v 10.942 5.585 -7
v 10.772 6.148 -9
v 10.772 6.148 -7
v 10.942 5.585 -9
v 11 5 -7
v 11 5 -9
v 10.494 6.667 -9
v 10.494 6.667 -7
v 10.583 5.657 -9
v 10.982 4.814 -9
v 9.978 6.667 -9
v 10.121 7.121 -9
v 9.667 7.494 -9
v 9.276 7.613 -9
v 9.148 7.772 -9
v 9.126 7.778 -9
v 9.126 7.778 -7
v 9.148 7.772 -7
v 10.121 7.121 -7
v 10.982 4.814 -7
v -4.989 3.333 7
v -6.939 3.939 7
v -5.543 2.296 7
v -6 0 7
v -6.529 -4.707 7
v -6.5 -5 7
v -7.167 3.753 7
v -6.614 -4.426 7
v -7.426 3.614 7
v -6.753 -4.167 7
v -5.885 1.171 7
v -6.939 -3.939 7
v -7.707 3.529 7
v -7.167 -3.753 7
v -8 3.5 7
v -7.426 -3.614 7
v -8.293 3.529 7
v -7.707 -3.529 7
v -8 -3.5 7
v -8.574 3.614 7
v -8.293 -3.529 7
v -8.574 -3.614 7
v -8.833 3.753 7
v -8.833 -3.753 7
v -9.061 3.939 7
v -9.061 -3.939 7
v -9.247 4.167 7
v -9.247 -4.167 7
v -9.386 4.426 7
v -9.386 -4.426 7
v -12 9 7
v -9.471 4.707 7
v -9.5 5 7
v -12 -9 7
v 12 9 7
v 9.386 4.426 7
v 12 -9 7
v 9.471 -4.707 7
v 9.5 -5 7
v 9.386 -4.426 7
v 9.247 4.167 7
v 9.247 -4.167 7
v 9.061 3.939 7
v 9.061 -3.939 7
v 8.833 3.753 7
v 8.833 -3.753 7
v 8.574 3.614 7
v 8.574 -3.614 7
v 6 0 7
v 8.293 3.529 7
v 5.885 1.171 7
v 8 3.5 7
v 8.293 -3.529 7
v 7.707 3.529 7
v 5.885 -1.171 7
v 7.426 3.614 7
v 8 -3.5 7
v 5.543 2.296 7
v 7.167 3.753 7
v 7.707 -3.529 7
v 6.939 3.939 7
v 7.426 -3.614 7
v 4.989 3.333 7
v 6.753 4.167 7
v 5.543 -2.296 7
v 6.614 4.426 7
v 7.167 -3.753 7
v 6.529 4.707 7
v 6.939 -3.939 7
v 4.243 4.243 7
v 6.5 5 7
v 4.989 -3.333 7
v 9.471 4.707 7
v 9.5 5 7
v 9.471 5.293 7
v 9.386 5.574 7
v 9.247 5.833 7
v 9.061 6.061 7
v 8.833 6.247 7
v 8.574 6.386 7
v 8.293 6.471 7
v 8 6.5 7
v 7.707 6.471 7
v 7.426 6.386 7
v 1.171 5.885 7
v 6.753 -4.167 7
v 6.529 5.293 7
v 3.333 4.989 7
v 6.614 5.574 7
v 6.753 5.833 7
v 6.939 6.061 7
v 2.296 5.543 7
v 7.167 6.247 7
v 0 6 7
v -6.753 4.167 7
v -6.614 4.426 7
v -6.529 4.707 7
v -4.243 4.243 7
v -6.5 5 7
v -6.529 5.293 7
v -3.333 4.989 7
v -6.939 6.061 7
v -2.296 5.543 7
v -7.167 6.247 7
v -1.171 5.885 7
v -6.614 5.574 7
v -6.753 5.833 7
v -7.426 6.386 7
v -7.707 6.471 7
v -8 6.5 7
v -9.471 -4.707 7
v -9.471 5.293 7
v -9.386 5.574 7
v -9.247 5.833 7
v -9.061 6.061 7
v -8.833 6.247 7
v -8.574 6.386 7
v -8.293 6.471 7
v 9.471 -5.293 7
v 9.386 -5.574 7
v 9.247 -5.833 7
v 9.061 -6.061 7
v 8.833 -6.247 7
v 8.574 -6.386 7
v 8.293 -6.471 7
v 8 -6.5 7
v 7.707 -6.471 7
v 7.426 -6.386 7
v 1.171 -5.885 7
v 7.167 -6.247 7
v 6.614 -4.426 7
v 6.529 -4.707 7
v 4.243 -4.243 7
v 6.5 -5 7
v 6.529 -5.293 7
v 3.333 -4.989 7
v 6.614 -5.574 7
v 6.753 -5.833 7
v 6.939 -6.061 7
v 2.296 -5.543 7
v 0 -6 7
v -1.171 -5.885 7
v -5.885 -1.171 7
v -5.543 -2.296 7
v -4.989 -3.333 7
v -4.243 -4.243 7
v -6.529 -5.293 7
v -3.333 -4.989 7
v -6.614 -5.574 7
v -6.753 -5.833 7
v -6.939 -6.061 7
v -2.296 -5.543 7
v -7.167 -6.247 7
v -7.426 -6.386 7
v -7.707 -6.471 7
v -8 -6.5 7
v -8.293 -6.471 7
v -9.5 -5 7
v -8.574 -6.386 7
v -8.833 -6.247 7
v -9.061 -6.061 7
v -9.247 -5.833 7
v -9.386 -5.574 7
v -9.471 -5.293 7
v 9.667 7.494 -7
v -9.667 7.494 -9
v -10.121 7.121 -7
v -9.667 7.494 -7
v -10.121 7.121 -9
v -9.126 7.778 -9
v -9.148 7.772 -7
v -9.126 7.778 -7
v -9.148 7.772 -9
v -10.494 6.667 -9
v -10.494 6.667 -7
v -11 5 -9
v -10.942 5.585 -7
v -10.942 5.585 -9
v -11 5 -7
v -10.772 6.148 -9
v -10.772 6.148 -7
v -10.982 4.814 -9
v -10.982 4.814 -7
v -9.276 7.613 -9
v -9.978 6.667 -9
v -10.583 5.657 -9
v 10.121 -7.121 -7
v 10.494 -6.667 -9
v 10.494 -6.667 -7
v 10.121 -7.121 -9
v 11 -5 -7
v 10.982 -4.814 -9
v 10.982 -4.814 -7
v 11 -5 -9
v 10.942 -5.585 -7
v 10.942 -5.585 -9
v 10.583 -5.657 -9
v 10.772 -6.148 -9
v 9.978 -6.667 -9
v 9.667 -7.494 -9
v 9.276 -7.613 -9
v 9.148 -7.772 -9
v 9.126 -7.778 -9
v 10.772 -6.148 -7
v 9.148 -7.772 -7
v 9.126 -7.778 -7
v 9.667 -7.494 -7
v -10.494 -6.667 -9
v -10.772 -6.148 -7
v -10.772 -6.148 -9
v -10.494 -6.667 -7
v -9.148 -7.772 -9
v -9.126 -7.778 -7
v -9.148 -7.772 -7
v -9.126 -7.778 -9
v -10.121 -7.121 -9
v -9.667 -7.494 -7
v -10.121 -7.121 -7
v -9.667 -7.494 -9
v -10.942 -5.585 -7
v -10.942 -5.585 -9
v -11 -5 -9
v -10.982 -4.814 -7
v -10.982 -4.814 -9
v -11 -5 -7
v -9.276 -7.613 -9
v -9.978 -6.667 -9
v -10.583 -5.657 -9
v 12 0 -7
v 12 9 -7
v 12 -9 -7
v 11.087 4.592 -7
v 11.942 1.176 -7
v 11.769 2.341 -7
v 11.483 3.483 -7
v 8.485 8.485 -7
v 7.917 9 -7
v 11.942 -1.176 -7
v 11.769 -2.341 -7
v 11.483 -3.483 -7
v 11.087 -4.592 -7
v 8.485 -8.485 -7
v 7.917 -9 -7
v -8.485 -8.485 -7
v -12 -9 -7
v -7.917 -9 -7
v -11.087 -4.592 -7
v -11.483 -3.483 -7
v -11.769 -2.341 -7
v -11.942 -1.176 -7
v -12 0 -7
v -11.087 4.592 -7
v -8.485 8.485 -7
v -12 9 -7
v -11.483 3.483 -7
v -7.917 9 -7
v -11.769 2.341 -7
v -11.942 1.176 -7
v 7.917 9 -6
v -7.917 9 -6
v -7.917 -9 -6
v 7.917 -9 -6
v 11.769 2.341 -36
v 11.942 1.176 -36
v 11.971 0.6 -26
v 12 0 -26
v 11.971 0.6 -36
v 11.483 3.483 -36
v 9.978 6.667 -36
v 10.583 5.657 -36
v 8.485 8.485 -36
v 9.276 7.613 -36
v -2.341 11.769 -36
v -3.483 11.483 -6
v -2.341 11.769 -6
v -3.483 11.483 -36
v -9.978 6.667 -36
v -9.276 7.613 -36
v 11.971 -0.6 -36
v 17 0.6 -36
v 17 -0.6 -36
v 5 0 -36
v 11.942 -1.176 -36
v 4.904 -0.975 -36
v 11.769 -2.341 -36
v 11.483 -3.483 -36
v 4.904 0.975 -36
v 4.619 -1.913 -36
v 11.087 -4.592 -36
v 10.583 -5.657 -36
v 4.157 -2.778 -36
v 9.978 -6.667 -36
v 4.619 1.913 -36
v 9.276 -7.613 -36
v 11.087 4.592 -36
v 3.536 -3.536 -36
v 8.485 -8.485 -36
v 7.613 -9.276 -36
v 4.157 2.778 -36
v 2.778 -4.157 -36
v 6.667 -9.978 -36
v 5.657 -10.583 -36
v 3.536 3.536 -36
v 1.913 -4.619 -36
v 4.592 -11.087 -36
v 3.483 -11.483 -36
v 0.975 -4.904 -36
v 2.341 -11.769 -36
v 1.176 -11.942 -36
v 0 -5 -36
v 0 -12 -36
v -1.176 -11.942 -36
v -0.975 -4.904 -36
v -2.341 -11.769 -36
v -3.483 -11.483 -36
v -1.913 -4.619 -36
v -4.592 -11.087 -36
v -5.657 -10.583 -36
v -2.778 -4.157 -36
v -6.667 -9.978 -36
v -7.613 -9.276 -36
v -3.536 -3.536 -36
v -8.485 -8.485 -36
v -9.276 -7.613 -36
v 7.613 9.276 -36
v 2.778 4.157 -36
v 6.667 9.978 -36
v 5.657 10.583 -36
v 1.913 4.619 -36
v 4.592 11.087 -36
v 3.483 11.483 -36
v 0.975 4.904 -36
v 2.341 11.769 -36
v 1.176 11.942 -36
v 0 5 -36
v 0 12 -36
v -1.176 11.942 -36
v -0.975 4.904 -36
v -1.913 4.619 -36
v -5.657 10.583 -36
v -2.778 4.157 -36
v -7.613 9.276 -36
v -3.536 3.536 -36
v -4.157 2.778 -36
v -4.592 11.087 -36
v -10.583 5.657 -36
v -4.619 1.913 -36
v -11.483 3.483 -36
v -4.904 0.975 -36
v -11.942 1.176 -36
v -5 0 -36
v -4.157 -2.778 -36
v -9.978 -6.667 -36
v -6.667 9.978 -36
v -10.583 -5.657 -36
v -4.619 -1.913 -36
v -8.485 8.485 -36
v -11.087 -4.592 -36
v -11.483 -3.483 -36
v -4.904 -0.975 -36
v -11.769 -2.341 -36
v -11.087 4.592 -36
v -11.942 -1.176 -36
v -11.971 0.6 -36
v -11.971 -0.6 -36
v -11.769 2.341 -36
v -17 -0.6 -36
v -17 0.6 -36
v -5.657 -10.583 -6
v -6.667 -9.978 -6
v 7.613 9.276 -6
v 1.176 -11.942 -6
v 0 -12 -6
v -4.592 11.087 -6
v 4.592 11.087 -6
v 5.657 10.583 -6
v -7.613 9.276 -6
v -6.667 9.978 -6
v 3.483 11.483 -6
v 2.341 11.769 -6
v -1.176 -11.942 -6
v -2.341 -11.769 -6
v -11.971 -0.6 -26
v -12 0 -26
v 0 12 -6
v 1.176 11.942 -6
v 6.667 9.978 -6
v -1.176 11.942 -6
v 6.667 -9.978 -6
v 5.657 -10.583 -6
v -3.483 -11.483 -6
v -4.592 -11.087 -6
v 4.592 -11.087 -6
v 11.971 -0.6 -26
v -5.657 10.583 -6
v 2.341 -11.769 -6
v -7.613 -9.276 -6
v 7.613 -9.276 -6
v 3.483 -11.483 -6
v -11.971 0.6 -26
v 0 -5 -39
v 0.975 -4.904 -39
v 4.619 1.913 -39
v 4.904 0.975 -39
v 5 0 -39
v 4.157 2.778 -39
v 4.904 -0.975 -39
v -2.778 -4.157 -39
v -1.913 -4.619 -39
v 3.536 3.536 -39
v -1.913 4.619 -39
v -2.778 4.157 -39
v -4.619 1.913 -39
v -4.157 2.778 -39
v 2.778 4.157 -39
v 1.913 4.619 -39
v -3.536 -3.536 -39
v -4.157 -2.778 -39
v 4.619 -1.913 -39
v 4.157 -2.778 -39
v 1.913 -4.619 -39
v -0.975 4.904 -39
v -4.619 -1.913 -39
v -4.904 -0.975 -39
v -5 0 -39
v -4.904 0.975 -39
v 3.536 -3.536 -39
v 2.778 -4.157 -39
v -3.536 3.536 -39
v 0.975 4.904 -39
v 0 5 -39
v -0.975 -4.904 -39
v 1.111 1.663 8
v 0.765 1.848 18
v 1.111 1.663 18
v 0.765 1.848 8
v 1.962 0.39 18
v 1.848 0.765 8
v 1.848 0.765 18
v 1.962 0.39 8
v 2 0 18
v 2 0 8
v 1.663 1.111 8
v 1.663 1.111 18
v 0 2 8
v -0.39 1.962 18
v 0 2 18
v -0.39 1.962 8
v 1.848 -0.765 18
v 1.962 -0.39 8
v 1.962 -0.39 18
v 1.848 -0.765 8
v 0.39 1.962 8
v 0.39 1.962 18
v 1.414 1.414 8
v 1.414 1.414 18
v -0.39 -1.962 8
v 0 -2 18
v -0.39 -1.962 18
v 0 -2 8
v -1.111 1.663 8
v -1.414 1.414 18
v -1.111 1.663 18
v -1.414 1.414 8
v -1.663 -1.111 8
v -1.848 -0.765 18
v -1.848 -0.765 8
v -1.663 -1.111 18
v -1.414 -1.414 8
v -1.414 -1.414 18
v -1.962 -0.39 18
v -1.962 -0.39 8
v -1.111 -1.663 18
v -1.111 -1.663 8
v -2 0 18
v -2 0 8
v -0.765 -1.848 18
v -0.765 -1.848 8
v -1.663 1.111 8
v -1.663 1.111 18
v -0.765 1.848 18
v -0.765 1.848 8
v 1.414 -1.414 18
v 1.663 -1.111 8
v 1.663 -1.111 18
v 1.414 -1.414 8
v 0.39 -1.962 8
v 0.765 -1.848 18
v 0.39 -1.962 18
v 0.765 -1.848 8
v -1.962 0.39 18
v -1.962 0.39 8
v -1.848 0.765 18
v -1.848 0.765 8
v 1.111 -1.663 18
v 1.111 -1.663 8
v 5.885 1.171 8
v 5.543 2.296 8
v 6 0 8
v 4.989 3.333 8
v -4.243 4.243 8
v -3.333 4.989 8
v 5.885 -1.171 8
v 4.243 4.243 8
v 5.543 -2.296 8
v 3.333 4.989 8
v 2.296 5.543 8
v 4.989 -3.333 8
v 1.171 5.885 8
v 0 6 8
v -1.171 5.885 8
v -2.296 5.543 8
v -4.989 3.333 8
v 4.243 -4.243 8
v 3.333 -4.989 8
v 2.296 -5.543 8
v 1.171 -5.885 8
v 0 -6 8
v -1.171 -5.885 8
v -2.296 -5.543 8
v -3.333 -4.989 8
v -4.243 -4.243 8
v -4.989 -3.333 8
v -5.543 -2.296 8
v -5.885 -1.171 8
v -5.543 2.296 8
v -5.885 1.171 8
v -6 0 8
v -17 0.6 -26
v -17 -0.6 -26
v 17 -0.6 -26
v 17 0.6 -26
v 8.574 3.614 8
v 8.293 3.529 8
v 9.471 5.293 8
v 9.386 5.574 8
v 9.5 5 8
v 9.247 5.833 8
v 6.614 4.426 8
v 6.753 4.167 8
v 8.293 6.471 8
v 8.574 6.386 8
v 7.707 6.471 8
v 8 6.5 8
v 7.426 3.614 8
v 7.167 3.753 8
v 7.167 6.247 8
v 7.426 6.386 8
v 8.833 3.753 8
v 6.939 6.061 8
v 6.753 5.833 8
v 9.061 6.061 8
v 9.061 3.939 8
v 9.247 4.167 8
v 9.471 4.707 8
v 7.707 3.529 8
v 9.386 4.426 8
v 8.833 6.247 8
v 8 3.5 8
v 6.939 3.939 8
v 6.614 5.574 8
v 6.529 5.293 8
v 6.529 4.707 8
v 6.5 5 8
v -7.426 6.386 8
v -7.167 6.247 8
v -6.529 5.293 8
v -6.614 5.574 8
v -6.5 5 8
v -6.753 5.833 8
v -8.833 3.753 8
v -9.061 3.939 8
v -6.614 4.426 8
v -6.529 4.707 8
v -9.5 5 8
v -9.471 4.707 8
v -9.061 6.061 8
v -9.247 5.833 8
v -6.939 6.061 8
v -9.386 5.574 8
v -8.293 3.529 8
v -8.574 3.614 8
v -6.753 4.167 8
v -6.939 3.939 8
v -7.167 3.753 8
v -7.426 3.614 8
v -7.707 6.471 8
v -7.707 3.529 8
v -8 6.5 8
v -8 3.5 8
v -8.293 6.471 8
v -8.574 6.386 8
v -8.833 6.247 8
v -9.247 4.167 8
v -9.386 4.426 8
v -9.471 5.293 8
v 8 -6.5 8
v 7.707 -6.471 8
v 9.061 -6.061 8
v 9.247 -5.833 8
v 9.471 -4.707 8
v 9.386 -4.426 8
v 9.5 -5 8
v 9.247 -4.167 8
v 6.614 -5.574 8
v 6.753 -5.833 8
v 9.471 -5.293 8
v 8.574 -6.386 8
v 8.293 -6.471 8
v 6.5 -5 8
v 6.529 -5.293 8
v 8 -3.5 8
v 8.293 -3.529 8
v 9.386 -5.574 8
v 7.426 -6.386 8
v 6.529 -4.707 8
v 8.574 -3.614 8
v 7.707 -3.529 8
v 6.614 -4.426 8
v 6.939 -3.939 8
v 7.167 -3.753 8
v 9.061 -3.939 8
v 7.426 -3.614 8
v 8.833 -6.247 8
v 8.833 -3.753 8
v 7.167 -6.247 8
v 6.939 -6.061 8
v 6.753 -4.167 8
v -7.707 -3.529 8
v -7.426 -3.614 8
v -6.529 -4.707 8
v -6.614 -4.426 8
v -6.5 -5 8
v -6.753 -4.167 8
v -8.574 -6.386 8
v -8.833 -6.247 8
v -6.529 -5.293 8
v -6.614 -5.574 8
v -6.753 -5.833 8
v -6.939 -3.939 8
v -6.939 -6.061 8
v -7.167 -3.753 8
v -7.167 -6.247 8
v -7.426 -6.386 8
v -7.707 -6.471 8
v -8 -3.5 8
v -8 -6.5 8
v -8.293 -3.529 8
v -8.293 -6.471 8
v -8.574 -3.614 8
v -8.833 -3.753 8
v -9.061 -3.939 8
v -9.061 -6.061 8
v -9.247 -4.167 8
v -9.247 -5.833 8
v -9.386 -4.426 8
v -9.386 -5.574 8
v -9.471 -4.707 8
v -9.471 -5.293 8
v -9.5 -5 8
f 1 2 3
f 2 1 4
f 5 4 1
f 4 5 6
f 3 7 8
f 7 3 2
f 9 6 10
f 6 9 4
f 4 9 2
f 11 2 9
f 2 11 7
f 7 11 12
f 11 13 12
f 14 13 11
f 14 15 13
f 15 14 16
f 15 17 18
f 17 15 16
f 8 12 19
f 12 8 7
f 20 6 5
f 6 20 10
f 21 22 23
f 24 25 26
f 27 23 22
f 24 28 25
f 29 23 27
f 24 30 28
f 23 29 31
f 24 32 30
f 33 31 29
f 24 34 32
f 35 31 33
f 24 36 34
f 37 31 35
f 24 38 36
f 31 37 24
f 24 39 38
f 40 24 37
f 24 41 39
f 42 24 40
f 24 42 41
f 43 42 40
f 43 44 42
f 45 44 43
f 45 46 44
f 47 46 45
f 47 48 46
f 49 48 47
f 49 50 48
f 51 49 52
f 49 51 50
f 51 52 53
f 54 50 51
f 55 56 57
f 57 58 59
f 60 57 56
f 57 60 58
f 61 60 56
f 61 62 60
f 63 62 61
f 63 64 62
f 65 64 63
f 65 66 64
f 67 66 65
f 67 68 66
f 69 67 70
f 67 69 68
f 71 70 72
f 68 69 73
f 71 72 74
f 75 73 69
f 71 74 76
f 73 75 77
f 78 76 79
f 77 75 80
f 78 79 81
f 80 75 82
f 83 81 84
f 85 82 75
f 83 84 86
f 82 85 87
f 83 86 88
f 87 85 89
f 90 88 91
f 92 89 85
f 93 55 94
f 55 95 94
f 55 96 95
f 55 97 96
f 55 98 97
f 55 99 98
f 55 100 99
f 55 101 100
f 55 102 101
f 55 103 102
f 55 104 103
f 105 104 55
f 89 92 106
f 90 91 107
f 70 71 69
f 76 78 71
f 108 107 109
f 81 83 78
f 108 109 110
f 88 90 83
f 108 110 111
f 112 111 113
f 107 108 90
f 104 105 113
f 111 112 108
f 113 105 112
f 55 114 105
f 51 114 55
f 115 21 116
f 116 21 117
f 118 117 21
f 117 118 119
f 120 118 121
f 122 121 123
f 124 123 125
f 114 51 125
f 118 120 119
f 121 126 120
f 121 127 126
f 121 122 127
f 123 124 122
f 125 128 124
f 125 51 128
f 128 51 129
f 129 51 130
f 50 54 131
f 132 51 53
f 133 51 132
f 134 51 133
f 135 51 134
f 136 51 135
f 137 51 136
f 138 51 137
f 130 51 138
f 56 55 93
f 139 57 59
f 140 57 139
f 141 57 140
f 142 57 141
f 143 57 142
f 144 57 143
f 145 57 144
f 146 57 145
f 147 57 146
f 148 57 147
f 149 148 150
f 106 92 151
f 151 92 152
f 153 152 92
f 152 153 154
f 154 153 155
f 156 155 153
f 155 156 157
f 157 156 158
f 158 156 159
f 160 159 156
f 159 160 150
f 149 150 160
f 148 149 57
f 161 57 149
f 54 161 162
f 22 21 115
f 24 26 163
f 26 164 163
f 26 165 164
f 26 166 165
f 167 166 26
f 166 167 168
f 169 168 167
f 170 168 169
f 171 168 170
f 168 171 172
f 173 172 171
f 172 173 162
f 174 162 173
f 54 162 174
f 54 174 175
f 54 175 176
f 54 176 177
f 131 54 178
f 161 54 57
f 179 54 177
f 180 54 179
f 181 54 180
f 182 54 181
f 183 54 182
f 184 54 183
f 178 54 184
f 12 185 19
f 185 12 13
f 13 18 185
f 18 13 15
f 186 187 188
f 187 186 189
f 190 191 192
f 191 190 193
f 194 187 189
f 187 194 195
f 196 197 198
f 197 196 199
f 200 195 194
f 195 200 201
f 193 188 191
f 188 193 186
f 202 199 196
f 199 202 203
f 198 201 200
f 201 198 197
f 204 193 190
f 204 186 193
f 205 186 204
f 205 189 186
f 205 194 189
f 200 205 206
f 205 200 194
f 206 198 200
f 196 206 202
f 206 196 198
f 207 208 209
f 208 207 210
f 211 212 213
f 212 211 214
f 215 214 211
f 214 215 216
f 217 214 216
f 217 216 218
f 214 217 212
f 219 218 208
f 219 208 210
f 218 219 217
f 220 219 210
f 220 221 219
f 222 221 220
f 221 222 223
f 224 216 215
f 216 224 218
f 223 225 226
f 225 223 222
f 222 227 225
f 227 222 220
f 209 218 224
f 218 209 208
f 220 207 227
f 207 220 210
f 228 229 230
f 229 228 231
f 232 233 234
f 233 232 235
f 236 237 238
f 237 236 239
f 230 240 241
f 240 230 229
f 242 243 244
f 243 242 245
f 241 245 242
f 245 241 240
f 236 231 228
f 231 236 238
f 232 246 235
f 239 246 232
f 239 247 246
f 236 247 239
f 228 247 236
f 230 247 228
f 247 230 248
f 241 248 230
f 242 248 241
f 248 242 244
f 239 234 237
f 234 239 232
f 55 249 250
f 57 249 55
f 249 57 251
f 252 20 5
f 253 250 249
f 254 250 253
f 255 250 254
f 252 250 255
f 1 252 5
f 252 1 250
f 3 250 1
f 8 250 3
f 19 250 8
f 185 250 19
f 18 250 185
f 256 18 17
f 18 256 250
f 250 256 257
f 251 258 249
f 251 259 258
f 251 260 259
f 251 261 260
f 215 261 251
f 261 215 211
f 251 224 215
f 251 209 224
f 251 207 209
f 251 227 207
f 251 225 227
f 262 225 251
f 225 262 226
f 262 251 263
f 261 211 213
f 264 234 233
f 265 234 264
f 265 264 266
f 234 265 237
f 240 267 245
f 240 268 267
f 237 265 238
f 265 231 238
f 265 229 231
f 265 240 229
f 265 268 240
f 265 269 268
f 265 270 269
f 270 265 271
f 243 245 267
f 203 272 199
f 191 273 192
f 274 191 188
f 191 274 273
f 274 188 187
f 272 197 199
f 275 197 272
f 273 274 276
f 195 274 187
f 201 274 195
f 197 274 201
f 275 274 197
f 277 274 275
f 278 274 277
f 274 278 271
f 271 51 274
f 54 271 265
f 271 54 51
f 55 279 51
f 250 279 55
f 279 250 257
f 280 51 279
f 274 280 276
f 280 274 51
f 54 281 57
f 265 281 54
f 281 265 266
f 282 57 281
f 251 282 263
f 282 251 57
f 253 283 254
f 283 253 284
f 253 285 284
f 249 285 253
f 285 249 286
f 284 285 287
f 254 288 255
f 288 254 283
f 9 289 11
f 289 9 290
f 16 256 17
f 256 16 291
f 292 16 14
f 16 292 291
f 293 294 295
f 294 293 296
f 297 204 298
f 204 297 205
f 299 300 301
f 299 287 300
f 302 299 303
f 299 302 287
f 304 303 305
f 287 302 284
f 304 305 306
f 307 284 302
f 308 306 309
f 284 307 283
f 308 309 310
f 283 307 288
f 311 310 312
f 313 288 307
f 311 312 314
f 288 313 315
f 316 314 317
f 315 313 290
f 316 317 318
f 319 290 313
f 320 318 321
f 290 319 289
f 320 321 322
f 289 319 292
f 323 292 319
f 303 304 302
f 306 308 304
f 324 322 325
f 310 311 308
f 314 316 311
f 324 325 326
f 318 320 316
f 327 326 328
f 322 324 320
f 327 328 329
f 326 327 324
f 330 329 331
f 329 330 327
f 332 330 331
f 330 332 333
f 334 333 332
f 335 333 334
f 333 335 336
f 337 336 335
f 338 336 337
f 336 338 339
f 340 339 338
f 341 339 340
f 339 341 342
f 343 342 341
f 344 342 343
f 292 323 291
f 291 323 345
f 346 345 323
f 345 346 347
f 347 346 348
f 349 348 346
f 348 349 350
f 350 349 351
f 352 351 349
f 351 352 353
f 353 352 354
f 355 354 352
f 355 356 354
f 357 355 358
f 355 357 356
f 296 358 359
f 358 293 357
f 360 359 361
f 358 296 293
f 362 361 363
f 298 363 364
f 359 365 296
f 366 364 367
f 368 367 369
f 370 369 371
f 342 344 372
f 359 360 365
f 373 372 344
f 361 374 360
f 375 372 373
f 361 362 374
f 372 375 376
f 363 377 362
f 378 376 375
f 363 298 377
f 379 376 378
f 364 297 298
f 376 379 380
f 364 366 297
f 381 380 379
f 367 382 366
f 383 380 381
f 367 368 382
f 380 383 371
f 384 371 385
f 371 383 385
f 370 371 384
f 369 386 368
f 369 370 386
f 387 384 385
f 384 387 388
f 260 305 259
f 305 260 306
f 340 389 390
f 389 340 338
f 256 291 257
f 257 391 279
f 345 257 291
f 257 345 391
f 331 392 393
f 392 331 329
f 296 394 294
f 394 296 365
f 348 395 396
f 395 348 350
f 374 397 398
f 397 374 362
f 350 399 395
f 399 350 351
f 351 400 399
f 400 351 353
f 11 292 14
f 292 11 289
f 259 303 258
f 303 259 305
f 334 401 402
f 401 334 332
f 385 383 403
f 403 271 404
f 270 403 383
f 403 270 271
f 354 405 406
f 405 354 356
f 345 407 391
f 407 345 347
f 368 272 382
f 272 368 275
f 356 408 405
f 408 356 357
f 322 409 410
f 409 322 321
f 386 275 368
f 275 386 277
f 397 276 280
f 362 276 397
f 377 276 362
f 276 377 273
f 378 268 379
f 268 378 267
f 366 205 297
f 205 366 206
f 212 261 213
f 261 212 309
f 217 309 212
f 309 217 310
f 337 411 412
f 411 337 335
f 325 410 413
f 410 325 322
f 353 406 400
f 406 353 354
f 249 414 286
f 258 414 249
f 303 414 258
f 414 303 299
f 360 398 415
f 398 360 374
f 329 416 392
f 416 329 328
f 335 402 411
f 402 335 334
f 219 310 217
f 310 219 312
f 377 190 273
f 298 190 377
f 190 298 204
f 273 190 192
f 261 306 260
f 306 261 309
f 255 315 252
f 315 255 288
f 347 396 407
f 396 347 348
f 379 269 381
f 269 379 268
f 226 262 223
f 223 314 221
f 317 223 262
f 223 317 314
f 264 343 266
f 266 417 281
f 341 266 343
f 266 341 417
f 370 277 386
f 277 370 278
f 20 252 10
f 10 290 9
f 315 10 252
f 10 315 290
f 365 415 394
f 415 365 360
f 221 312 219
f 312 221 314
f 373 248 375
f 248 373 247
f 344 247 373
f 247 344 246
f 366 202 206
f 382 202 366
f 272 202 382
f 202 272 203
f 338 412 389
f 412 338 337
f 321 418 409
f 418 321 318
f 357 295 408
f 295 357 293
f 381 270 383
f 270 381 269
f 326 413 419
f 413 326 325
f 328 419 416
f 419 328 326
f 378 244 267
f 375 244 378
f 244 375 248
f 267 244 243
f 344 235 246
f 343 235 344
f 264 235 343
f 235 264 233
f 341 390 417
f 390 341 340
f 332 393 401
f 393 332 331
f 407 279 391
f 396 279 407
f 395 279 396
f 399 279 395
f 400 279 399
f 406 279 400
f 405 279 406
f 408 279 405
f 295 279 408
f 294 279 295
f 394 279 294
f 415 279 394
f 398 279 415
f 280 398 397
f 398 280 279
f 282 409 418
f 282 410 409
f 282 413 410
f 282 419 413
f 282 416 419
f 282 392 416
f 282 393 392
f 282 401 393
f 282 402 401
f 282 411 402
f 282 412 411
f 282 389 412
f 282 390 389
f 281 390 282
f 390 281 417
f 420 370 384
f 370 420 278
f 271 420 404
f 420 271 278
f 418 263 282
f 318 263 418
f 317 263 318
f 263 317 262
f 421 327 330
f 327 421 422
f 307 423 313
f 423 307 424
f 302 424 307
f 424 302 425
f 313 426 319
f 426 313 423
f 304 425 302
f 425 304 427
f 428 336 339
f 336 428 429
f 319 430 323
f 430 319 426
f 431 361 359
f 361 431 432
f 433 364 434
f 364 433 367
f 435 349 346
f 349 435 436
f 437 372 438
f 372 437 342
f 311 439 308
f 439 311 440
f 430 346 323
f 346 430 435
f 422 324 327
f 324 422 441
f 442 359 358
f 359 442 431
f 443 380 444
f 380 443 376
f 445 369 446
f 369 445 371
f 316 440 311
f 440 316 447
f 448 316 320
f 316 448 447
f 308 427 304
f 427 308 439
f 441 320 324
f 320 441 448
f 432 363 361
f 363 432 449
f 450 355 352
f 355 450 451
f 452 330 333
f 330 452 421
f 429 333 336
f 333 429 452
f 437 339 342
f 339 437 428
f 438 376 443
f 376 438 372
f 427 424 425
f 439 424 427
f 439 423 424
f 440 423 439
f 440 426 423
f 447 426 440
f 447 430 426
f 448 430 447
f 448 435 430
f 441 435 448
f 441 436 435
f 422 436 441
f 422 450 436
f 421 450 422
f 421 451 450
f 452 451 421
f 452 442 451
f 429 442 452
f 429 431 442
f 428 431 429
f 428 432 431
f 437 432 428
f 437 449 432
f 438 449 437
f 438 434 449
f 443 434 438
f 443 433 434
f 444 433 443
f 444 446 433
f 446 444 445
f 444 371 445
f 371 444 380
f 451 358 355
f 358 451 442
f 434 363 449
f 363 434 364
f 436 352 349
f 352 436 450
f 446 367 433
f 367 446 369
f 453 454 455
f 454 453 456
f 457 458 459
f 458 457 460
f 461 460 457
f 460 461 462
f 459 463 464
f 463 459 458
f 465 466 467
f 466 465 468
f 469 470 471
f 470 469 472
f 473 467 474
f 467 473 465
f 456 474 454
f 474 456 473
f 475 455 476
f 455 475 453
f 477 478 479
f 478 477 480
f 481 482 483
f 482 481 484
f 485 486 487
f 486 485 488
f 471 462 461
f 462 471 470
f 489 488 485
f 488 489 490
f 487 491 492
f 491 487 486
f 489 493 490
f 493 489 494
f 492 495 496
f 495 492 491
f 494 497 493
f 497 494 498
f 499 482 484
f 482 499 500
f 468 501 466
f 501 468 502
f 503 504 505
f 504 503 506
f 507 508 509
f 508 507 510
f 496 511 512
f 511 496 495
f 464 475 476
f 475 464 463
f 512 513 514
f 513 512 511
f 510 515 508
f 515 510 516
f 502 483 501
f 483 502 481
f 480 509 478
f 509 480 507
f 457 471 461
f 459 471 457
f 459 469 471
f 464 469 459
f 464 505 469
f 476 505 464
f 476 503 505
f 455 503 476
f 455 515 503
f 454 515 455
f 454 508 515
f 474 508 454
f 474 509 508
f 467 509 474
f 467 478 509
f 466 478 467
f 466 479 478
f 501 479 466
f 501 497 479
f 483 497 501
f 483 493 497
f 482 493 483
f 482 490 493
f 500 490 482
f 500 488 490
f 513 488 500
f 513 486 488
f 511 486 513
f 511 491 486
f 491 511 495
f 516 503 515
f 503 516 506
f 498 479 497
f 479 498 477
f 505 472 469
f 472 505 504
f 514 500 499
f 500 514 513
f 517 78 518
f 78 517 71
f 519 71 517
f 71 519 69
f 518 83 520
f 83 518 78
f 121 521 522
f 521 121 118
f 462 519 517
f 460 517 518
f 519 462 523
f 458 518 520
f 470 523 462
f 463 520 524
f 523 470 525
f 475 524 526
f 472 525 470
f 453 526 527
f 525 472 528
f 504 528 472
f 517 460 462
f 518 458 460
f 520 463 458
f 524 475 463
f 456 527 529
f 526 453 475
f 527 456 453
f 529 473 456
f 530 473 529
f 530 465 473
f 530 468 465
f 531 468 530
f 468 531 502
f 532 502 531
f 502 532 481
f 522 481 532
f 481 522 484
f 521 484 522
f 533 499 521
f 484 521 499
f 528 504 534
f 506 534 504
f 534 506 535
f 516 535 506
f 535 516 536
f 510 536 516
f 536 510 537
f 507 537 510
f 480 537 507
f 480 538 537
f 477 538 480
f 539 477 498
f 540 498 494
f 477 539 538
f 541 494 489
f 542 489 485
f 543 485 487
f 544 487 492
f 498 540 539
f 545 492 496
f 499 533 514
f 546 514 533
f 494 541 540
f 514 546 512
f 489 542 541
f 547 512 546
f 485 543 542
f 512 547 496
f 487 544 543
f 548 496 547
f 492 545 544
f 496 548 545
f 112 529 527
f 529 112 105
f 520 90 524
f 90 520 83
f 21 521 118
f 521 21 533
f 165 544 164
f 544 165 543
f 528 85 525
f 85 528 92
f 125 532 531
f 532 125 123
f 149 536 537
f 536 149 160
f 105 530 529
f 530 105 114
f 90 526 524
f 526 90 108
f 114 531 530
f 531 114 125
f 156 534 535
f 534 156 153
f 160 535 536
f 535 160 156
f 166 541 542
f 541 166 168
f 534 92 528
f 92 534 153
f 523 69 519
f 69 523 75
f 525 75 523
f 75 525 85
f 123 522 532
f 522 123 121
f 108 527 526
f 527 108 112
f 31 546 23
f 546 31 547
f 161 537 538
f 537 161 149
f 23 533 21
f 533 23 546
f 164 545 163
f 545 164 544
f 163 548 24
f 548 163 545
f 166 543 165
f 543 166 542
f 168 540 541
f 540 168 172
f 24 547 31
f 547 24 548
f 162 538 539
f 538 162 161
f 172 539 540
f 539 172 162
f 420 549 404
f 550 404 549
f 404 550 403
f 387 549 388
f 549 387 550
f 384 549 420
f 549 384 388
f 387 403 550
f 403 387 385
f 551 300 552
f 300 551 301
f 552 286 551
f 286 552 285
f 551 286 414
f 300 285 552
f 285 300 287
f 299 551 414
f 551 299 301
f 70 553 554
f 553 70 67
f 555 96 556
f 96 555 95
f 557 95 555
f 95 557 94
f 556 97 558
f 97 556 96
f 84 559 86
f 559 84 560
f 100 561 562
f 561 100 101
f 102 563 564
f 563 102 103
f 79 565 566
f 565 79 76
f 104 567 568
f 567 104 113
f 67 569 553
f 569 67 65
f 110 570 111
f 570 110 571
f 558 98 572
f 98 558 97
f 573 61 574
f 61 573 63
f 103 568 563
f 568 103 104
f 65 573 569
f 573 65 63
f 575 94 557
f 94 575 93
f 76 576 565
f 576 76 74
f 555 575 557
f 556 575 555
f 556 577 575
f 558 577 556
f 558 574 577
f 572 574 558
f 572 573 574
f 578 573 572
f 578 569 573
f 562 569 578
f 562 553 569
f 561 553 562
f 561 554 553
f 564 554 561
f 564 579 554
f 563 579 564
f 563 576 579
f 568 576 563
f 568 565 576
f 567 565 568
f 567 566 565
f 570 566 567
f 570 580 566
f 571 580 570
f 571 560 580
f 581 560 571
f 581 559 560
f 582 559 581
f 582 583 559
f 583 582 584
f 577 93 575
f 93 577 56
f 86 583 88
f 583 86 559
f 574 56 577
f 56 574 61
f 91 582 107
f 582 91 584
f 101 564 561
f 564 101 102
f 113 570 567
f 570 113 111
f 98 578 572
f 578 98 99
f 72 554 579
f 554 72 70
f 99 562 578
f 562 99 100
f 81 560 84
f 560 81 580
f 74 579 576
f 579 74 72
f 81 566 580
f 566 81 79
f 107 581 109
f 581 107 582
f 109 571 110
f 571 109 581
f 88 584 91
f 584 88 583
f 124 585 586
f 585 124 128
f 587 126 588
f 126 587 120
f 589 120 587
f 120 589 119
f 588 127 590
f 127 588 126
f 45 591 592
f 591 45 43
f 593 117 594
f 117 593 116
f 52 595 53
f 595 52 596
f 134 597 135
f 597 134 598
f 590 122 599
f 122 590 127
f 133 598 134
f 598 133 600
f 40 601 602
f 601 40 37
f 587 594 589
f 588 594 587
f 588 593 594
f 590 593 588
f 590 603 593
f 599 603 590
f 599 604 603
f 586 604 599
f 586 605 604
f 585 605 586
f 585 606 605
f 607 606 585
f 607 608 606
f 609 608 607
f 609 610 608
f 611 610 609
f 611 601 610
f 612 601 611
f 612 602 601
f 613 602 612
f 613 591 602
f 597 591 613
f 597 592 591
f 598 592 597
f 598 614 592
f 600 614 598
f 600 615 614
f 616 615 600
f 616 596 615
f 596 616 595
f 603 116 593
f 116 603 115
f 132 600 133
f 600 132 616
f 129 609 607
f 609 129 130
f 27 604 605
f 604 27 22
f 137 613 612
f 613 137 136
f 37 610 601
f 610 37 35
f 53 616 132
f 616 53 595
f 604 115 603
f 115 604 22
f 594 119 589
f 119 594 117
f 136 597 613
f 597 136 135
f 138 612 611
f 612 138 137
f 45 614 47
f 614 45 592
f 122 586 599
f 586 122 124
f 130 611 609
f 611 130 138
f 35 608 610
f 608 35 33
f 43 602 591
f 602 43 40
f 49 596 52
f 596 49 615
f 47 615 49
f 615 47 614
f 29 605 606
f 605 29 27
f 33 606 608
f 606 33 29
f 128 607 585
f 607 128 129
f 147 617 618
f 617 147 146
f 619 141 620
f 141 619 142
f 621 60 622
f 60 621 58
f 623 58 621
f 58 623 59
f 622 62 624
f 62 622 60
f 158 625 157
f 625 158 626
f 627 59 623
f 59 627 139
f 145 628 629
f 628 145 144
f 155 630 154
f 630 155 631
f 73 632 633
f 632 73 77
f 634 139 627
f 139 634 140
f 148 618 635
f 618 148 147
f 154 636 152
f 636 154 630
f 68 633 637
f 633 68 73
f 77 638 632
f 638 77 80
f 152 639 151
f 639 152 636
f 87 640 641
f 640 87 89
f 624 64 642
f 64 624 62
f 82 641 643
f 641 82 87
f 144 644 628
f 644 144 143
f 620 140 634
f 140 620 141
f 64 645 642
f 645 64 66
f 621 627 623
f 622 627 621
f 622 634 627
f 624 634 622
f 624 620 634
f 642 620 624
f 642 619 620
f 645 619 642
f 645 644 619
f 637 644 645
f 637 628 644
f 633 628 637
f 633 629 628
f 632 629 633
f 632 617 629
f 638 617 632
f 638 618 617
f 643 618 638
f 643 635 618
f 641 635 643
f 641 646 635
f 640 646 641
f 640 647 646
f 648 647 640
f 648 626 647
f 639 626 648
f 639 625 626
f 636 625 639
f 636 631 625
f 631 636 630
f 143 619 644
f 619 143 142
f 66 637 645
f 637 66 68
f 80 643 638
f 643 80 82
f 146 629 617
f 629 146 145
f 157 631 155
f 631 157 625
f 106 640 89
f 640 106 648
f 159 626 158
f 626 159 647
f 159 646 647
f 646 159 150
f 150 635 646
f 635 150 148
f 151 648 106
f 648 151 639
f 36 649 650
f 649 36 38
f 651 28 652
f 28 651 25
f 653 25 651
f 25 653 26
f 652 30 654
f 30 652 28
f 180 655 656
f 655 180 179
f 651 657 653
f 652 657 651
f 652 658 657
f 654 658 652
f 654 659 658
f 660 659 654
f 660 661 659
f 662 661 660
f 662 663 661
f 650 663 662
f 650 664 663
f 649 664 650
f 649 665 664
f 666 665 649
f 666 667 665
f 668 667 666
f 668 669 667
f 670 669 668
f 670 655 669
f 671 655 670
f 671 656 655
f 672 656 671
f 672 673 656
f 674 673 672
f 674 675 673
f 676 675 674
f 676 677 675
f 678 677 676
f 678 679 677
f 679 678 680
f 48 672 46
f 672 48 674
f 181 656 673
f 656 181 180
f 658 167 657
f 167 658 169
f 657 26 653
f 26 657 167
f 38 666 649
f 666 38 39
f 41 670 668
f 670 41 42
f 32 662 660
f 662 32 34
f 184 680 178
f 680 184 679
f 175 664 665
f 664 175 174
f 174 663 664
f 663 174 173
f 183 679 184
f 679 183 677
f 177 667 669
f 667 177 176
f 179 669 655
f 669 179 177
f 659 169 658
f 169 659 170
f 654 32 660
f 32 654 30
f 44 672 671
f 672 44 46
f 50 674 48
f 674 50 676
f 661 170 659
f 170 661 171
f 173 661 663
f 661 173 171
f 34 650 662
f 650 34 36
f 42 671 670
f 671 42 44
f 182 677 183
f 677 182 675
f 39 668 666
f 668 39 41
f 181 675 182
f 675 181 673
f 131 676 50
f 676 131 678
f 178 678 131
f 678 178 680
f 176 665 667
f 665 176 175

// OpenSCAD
// Parameters
type_vector_0 = 6; //[3:12:0.1]
type_vector_1 = 5.5; //[2.75:11:0.1]
type_vector_2 = 14.7; //[7.35:29.4:0.1]
type_vector_3 = 12; //[6:24:0.1]
alpha = 1; //[0.1:1:0.05]
eps = 1; //[0.5:2:0.1]
gearbox_w = 24; //[12:48:0.5]
gearbox_d = 18; //[9:36:0.5]
gearbox_h = 14; //[7:28:0.5]
motor_diam = 24; //[12:48:0.5]
motor_len = 30; //[15:60:0.5]
hub_diam = 10; //[5:20:0.5]
hub_len = 3; //[1.5:6:0.25]
shaft_diam = 4; //[2:8:0.25]
shaft_len = 12; //[6:24:0.5]
shaft_boss_diam = 12; //[6:24:0.5]
shaft_boss_h = 3; //[1.5:6:0.25]
screw_boss_diam = 6; //[3:12:0.25]
screw_boss_h = 2; //[1:6:0.25]
screw_hole_diam = 3; //[1.5:6:0.25]
screw_spacing_x = 16; //[8:32:0.5]
screw_spacing_y = 10; //[5:20:0.5]
tag_w = 6; //[3:12:0.25]
tag_t = 1.2; //[0.6:2.4:0.1]
tag_l = 10; //[5:20:0.5]

// Gear Motor - complete geometry
module gear_motor() {
  color("DimGray") {
    // Gearbox housing
    translate([0, 0, 0])
      cube([gearbox_w, gearbox_d, gearbox_h], center=true);

    // Motor can
    translate([0, 0, -gearbox_h/2 - motor_len/2 + eps])
      cylinder(h=motor_len, r=motor_diam/2, center=true, $fn=64);

    // Motor hub
    translate([0, 0, -gearbox_h/2 - motor_len - hub_len/2 + eps])
      cylinder(h=hub_len, r=hub_diam/2, center=true, $fn=32);

    // Shaft
    translate([0, 0, gearbox_h/2 + shaft_len/2 - eps])
      cylinder(h=shaft_len, r=shaft_diam/2, center=true, $fn=32);

    // Shaft boss
    translate([0, 0, gearbox_h/2 - shaft_boss_h/2 + eps])
      cylinder(h=shaft_boss_h, r=shaft_boss_diam/2, center=true, $fn=32);

    // Mounting screw bosses
    union() {
      translate([screw_spacing_x/2, screw_spacing_y/2, -screw_boss_h/2])
        cylinder(h=gearbox_h + screw_boss_h, r=screw_boss_diam/2, center=true, $fn=32);
      translate([-screw_spacing_x/2, screw_spacing_y/2, -screw_boss_h/2])
        cylinder(h=gearbox_h + screw_boss_h, r=screw_boss_diam/2, center=true, $fn=32);
      translate([screw_spacing_x/2, -screw_spacing_y/2, -screw_boss_h/2])
        cylinder(h=gearbox_h + screw_boss_h, r=screw_boss_diam/2, center=true, $fn=32);
      translate([-screw_spacing_x/2, -screw_spacing_y/2, -screw_boss_h/2])
        cylinder(h=gearbox_h + screw_boss_h, r=screw_boss_diam/2, center=true, $fn=32);
    }

    // Electrical tags
    translate([-motor_diam/2 - tag_w/2 + eps, 0, -gearbox_h/2 - motor_len + tag_l/2 + eps])
      cube([tag_w, tag_t, tag_l], center=true);
    translate([motor_diam/2 + tag_w/2 - eps, 0, -gearbox_h/2 - motor_len + tag_l/2 + eps])
      cube([tag_w, tag_t, tag_l], center=true);
  }

  // Drilled holes for screws
  color("Black") {
    difference() {
      union() {
        translate([screw_spacing_x/2, screw_spacing_y/2, -screw_boss_h/2])
          cylinder(h=gearbox_h + screw_boss_h + 2*eps, r=screw_hole_diam/2, center=true, $fn=32);
        translate([-screw_spacing_x/2, screw_spacing_y/2, -screw_boss_h/2])
          cylinder(h=gearbox_h + screw_boss_h + 2*eps, r=screw_hole_diam/2, center=true, $fn=32);
        translate([screw_spacing_x/2, -screw_spacing_y/2, -screw_boss_h/2])
          cylinder(h=gearbox_h + screw_boss_h + 2*eps, r=screw_hole_diam/2, center=true, $fn=32);
        translate([-screw_spacing_x/2, -screw_spacing_y/2, -screw_boss_h/2])
          cylinder(h=gearbox_h + screw_boss_h + 2*eps, r=screw_hole_diam/2, center=true, $fn=32);
      }
    }
  }
}

// Assembly
module assembly() {
  gear_motor();
}

assembly();
